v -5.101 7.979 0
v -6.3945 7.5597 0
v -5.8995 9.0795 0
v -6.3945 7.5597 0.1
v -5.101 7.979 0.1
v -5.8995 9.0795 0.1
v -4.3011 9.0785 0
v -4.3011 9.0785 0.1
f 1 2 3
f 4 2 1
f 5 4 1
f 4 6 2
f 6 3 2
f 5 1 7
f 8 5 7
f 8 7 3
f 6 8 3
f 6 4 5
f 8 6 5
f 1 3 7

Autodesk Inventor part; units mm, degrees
ref_plane "YZ Plane" through (0, 0, 0) normal (1, 0, 0) x (0, 1, 0)
ref_plane "XZ Plane" through (0, 0, 0) normal (0, 1, 0) x (-1, 0, 0)
ref_plane "XY Plane" through (0, 0, 0) normal (0, 0, 1) x (1, 0, 0)
sketch "Boceto1" plane through (0, 0, 0) normal (0, 0, 1) x (1, 0, 0)
  line L0 (-5.101, 7.979) -> (-5.1003, 9.079) projected
  line L1 (-5.1003, 9.079) -> (-5.8995, 9.0795) projected
  line L2 (-5.101, 7.979) -> (-5.8995, 9.0795) projected
  line L3 (-5.8995, 9.0795) -> (-5.1003, 9.079)
  line L4 (-5.101, 7.979) -> (-5.8995, 9.0795)
  line L5 (-5.1003, 9.079) -> (-5.101, 7.979)
  line L6 (-5.1003, 9.079) -> (-4.3011, 9.0785)
  line L7 (-5.101, 7.979) -> (-4.3011, 9.0785)
  point P0 (0, 0)
extrude "Extrusión1" add sketch "Boceto1" along normal blind 0.1
mirror "Simetría1" about plane through (-5.8995, 9.0795, 0) normal (-0.8094085, -0.587246, 0)
